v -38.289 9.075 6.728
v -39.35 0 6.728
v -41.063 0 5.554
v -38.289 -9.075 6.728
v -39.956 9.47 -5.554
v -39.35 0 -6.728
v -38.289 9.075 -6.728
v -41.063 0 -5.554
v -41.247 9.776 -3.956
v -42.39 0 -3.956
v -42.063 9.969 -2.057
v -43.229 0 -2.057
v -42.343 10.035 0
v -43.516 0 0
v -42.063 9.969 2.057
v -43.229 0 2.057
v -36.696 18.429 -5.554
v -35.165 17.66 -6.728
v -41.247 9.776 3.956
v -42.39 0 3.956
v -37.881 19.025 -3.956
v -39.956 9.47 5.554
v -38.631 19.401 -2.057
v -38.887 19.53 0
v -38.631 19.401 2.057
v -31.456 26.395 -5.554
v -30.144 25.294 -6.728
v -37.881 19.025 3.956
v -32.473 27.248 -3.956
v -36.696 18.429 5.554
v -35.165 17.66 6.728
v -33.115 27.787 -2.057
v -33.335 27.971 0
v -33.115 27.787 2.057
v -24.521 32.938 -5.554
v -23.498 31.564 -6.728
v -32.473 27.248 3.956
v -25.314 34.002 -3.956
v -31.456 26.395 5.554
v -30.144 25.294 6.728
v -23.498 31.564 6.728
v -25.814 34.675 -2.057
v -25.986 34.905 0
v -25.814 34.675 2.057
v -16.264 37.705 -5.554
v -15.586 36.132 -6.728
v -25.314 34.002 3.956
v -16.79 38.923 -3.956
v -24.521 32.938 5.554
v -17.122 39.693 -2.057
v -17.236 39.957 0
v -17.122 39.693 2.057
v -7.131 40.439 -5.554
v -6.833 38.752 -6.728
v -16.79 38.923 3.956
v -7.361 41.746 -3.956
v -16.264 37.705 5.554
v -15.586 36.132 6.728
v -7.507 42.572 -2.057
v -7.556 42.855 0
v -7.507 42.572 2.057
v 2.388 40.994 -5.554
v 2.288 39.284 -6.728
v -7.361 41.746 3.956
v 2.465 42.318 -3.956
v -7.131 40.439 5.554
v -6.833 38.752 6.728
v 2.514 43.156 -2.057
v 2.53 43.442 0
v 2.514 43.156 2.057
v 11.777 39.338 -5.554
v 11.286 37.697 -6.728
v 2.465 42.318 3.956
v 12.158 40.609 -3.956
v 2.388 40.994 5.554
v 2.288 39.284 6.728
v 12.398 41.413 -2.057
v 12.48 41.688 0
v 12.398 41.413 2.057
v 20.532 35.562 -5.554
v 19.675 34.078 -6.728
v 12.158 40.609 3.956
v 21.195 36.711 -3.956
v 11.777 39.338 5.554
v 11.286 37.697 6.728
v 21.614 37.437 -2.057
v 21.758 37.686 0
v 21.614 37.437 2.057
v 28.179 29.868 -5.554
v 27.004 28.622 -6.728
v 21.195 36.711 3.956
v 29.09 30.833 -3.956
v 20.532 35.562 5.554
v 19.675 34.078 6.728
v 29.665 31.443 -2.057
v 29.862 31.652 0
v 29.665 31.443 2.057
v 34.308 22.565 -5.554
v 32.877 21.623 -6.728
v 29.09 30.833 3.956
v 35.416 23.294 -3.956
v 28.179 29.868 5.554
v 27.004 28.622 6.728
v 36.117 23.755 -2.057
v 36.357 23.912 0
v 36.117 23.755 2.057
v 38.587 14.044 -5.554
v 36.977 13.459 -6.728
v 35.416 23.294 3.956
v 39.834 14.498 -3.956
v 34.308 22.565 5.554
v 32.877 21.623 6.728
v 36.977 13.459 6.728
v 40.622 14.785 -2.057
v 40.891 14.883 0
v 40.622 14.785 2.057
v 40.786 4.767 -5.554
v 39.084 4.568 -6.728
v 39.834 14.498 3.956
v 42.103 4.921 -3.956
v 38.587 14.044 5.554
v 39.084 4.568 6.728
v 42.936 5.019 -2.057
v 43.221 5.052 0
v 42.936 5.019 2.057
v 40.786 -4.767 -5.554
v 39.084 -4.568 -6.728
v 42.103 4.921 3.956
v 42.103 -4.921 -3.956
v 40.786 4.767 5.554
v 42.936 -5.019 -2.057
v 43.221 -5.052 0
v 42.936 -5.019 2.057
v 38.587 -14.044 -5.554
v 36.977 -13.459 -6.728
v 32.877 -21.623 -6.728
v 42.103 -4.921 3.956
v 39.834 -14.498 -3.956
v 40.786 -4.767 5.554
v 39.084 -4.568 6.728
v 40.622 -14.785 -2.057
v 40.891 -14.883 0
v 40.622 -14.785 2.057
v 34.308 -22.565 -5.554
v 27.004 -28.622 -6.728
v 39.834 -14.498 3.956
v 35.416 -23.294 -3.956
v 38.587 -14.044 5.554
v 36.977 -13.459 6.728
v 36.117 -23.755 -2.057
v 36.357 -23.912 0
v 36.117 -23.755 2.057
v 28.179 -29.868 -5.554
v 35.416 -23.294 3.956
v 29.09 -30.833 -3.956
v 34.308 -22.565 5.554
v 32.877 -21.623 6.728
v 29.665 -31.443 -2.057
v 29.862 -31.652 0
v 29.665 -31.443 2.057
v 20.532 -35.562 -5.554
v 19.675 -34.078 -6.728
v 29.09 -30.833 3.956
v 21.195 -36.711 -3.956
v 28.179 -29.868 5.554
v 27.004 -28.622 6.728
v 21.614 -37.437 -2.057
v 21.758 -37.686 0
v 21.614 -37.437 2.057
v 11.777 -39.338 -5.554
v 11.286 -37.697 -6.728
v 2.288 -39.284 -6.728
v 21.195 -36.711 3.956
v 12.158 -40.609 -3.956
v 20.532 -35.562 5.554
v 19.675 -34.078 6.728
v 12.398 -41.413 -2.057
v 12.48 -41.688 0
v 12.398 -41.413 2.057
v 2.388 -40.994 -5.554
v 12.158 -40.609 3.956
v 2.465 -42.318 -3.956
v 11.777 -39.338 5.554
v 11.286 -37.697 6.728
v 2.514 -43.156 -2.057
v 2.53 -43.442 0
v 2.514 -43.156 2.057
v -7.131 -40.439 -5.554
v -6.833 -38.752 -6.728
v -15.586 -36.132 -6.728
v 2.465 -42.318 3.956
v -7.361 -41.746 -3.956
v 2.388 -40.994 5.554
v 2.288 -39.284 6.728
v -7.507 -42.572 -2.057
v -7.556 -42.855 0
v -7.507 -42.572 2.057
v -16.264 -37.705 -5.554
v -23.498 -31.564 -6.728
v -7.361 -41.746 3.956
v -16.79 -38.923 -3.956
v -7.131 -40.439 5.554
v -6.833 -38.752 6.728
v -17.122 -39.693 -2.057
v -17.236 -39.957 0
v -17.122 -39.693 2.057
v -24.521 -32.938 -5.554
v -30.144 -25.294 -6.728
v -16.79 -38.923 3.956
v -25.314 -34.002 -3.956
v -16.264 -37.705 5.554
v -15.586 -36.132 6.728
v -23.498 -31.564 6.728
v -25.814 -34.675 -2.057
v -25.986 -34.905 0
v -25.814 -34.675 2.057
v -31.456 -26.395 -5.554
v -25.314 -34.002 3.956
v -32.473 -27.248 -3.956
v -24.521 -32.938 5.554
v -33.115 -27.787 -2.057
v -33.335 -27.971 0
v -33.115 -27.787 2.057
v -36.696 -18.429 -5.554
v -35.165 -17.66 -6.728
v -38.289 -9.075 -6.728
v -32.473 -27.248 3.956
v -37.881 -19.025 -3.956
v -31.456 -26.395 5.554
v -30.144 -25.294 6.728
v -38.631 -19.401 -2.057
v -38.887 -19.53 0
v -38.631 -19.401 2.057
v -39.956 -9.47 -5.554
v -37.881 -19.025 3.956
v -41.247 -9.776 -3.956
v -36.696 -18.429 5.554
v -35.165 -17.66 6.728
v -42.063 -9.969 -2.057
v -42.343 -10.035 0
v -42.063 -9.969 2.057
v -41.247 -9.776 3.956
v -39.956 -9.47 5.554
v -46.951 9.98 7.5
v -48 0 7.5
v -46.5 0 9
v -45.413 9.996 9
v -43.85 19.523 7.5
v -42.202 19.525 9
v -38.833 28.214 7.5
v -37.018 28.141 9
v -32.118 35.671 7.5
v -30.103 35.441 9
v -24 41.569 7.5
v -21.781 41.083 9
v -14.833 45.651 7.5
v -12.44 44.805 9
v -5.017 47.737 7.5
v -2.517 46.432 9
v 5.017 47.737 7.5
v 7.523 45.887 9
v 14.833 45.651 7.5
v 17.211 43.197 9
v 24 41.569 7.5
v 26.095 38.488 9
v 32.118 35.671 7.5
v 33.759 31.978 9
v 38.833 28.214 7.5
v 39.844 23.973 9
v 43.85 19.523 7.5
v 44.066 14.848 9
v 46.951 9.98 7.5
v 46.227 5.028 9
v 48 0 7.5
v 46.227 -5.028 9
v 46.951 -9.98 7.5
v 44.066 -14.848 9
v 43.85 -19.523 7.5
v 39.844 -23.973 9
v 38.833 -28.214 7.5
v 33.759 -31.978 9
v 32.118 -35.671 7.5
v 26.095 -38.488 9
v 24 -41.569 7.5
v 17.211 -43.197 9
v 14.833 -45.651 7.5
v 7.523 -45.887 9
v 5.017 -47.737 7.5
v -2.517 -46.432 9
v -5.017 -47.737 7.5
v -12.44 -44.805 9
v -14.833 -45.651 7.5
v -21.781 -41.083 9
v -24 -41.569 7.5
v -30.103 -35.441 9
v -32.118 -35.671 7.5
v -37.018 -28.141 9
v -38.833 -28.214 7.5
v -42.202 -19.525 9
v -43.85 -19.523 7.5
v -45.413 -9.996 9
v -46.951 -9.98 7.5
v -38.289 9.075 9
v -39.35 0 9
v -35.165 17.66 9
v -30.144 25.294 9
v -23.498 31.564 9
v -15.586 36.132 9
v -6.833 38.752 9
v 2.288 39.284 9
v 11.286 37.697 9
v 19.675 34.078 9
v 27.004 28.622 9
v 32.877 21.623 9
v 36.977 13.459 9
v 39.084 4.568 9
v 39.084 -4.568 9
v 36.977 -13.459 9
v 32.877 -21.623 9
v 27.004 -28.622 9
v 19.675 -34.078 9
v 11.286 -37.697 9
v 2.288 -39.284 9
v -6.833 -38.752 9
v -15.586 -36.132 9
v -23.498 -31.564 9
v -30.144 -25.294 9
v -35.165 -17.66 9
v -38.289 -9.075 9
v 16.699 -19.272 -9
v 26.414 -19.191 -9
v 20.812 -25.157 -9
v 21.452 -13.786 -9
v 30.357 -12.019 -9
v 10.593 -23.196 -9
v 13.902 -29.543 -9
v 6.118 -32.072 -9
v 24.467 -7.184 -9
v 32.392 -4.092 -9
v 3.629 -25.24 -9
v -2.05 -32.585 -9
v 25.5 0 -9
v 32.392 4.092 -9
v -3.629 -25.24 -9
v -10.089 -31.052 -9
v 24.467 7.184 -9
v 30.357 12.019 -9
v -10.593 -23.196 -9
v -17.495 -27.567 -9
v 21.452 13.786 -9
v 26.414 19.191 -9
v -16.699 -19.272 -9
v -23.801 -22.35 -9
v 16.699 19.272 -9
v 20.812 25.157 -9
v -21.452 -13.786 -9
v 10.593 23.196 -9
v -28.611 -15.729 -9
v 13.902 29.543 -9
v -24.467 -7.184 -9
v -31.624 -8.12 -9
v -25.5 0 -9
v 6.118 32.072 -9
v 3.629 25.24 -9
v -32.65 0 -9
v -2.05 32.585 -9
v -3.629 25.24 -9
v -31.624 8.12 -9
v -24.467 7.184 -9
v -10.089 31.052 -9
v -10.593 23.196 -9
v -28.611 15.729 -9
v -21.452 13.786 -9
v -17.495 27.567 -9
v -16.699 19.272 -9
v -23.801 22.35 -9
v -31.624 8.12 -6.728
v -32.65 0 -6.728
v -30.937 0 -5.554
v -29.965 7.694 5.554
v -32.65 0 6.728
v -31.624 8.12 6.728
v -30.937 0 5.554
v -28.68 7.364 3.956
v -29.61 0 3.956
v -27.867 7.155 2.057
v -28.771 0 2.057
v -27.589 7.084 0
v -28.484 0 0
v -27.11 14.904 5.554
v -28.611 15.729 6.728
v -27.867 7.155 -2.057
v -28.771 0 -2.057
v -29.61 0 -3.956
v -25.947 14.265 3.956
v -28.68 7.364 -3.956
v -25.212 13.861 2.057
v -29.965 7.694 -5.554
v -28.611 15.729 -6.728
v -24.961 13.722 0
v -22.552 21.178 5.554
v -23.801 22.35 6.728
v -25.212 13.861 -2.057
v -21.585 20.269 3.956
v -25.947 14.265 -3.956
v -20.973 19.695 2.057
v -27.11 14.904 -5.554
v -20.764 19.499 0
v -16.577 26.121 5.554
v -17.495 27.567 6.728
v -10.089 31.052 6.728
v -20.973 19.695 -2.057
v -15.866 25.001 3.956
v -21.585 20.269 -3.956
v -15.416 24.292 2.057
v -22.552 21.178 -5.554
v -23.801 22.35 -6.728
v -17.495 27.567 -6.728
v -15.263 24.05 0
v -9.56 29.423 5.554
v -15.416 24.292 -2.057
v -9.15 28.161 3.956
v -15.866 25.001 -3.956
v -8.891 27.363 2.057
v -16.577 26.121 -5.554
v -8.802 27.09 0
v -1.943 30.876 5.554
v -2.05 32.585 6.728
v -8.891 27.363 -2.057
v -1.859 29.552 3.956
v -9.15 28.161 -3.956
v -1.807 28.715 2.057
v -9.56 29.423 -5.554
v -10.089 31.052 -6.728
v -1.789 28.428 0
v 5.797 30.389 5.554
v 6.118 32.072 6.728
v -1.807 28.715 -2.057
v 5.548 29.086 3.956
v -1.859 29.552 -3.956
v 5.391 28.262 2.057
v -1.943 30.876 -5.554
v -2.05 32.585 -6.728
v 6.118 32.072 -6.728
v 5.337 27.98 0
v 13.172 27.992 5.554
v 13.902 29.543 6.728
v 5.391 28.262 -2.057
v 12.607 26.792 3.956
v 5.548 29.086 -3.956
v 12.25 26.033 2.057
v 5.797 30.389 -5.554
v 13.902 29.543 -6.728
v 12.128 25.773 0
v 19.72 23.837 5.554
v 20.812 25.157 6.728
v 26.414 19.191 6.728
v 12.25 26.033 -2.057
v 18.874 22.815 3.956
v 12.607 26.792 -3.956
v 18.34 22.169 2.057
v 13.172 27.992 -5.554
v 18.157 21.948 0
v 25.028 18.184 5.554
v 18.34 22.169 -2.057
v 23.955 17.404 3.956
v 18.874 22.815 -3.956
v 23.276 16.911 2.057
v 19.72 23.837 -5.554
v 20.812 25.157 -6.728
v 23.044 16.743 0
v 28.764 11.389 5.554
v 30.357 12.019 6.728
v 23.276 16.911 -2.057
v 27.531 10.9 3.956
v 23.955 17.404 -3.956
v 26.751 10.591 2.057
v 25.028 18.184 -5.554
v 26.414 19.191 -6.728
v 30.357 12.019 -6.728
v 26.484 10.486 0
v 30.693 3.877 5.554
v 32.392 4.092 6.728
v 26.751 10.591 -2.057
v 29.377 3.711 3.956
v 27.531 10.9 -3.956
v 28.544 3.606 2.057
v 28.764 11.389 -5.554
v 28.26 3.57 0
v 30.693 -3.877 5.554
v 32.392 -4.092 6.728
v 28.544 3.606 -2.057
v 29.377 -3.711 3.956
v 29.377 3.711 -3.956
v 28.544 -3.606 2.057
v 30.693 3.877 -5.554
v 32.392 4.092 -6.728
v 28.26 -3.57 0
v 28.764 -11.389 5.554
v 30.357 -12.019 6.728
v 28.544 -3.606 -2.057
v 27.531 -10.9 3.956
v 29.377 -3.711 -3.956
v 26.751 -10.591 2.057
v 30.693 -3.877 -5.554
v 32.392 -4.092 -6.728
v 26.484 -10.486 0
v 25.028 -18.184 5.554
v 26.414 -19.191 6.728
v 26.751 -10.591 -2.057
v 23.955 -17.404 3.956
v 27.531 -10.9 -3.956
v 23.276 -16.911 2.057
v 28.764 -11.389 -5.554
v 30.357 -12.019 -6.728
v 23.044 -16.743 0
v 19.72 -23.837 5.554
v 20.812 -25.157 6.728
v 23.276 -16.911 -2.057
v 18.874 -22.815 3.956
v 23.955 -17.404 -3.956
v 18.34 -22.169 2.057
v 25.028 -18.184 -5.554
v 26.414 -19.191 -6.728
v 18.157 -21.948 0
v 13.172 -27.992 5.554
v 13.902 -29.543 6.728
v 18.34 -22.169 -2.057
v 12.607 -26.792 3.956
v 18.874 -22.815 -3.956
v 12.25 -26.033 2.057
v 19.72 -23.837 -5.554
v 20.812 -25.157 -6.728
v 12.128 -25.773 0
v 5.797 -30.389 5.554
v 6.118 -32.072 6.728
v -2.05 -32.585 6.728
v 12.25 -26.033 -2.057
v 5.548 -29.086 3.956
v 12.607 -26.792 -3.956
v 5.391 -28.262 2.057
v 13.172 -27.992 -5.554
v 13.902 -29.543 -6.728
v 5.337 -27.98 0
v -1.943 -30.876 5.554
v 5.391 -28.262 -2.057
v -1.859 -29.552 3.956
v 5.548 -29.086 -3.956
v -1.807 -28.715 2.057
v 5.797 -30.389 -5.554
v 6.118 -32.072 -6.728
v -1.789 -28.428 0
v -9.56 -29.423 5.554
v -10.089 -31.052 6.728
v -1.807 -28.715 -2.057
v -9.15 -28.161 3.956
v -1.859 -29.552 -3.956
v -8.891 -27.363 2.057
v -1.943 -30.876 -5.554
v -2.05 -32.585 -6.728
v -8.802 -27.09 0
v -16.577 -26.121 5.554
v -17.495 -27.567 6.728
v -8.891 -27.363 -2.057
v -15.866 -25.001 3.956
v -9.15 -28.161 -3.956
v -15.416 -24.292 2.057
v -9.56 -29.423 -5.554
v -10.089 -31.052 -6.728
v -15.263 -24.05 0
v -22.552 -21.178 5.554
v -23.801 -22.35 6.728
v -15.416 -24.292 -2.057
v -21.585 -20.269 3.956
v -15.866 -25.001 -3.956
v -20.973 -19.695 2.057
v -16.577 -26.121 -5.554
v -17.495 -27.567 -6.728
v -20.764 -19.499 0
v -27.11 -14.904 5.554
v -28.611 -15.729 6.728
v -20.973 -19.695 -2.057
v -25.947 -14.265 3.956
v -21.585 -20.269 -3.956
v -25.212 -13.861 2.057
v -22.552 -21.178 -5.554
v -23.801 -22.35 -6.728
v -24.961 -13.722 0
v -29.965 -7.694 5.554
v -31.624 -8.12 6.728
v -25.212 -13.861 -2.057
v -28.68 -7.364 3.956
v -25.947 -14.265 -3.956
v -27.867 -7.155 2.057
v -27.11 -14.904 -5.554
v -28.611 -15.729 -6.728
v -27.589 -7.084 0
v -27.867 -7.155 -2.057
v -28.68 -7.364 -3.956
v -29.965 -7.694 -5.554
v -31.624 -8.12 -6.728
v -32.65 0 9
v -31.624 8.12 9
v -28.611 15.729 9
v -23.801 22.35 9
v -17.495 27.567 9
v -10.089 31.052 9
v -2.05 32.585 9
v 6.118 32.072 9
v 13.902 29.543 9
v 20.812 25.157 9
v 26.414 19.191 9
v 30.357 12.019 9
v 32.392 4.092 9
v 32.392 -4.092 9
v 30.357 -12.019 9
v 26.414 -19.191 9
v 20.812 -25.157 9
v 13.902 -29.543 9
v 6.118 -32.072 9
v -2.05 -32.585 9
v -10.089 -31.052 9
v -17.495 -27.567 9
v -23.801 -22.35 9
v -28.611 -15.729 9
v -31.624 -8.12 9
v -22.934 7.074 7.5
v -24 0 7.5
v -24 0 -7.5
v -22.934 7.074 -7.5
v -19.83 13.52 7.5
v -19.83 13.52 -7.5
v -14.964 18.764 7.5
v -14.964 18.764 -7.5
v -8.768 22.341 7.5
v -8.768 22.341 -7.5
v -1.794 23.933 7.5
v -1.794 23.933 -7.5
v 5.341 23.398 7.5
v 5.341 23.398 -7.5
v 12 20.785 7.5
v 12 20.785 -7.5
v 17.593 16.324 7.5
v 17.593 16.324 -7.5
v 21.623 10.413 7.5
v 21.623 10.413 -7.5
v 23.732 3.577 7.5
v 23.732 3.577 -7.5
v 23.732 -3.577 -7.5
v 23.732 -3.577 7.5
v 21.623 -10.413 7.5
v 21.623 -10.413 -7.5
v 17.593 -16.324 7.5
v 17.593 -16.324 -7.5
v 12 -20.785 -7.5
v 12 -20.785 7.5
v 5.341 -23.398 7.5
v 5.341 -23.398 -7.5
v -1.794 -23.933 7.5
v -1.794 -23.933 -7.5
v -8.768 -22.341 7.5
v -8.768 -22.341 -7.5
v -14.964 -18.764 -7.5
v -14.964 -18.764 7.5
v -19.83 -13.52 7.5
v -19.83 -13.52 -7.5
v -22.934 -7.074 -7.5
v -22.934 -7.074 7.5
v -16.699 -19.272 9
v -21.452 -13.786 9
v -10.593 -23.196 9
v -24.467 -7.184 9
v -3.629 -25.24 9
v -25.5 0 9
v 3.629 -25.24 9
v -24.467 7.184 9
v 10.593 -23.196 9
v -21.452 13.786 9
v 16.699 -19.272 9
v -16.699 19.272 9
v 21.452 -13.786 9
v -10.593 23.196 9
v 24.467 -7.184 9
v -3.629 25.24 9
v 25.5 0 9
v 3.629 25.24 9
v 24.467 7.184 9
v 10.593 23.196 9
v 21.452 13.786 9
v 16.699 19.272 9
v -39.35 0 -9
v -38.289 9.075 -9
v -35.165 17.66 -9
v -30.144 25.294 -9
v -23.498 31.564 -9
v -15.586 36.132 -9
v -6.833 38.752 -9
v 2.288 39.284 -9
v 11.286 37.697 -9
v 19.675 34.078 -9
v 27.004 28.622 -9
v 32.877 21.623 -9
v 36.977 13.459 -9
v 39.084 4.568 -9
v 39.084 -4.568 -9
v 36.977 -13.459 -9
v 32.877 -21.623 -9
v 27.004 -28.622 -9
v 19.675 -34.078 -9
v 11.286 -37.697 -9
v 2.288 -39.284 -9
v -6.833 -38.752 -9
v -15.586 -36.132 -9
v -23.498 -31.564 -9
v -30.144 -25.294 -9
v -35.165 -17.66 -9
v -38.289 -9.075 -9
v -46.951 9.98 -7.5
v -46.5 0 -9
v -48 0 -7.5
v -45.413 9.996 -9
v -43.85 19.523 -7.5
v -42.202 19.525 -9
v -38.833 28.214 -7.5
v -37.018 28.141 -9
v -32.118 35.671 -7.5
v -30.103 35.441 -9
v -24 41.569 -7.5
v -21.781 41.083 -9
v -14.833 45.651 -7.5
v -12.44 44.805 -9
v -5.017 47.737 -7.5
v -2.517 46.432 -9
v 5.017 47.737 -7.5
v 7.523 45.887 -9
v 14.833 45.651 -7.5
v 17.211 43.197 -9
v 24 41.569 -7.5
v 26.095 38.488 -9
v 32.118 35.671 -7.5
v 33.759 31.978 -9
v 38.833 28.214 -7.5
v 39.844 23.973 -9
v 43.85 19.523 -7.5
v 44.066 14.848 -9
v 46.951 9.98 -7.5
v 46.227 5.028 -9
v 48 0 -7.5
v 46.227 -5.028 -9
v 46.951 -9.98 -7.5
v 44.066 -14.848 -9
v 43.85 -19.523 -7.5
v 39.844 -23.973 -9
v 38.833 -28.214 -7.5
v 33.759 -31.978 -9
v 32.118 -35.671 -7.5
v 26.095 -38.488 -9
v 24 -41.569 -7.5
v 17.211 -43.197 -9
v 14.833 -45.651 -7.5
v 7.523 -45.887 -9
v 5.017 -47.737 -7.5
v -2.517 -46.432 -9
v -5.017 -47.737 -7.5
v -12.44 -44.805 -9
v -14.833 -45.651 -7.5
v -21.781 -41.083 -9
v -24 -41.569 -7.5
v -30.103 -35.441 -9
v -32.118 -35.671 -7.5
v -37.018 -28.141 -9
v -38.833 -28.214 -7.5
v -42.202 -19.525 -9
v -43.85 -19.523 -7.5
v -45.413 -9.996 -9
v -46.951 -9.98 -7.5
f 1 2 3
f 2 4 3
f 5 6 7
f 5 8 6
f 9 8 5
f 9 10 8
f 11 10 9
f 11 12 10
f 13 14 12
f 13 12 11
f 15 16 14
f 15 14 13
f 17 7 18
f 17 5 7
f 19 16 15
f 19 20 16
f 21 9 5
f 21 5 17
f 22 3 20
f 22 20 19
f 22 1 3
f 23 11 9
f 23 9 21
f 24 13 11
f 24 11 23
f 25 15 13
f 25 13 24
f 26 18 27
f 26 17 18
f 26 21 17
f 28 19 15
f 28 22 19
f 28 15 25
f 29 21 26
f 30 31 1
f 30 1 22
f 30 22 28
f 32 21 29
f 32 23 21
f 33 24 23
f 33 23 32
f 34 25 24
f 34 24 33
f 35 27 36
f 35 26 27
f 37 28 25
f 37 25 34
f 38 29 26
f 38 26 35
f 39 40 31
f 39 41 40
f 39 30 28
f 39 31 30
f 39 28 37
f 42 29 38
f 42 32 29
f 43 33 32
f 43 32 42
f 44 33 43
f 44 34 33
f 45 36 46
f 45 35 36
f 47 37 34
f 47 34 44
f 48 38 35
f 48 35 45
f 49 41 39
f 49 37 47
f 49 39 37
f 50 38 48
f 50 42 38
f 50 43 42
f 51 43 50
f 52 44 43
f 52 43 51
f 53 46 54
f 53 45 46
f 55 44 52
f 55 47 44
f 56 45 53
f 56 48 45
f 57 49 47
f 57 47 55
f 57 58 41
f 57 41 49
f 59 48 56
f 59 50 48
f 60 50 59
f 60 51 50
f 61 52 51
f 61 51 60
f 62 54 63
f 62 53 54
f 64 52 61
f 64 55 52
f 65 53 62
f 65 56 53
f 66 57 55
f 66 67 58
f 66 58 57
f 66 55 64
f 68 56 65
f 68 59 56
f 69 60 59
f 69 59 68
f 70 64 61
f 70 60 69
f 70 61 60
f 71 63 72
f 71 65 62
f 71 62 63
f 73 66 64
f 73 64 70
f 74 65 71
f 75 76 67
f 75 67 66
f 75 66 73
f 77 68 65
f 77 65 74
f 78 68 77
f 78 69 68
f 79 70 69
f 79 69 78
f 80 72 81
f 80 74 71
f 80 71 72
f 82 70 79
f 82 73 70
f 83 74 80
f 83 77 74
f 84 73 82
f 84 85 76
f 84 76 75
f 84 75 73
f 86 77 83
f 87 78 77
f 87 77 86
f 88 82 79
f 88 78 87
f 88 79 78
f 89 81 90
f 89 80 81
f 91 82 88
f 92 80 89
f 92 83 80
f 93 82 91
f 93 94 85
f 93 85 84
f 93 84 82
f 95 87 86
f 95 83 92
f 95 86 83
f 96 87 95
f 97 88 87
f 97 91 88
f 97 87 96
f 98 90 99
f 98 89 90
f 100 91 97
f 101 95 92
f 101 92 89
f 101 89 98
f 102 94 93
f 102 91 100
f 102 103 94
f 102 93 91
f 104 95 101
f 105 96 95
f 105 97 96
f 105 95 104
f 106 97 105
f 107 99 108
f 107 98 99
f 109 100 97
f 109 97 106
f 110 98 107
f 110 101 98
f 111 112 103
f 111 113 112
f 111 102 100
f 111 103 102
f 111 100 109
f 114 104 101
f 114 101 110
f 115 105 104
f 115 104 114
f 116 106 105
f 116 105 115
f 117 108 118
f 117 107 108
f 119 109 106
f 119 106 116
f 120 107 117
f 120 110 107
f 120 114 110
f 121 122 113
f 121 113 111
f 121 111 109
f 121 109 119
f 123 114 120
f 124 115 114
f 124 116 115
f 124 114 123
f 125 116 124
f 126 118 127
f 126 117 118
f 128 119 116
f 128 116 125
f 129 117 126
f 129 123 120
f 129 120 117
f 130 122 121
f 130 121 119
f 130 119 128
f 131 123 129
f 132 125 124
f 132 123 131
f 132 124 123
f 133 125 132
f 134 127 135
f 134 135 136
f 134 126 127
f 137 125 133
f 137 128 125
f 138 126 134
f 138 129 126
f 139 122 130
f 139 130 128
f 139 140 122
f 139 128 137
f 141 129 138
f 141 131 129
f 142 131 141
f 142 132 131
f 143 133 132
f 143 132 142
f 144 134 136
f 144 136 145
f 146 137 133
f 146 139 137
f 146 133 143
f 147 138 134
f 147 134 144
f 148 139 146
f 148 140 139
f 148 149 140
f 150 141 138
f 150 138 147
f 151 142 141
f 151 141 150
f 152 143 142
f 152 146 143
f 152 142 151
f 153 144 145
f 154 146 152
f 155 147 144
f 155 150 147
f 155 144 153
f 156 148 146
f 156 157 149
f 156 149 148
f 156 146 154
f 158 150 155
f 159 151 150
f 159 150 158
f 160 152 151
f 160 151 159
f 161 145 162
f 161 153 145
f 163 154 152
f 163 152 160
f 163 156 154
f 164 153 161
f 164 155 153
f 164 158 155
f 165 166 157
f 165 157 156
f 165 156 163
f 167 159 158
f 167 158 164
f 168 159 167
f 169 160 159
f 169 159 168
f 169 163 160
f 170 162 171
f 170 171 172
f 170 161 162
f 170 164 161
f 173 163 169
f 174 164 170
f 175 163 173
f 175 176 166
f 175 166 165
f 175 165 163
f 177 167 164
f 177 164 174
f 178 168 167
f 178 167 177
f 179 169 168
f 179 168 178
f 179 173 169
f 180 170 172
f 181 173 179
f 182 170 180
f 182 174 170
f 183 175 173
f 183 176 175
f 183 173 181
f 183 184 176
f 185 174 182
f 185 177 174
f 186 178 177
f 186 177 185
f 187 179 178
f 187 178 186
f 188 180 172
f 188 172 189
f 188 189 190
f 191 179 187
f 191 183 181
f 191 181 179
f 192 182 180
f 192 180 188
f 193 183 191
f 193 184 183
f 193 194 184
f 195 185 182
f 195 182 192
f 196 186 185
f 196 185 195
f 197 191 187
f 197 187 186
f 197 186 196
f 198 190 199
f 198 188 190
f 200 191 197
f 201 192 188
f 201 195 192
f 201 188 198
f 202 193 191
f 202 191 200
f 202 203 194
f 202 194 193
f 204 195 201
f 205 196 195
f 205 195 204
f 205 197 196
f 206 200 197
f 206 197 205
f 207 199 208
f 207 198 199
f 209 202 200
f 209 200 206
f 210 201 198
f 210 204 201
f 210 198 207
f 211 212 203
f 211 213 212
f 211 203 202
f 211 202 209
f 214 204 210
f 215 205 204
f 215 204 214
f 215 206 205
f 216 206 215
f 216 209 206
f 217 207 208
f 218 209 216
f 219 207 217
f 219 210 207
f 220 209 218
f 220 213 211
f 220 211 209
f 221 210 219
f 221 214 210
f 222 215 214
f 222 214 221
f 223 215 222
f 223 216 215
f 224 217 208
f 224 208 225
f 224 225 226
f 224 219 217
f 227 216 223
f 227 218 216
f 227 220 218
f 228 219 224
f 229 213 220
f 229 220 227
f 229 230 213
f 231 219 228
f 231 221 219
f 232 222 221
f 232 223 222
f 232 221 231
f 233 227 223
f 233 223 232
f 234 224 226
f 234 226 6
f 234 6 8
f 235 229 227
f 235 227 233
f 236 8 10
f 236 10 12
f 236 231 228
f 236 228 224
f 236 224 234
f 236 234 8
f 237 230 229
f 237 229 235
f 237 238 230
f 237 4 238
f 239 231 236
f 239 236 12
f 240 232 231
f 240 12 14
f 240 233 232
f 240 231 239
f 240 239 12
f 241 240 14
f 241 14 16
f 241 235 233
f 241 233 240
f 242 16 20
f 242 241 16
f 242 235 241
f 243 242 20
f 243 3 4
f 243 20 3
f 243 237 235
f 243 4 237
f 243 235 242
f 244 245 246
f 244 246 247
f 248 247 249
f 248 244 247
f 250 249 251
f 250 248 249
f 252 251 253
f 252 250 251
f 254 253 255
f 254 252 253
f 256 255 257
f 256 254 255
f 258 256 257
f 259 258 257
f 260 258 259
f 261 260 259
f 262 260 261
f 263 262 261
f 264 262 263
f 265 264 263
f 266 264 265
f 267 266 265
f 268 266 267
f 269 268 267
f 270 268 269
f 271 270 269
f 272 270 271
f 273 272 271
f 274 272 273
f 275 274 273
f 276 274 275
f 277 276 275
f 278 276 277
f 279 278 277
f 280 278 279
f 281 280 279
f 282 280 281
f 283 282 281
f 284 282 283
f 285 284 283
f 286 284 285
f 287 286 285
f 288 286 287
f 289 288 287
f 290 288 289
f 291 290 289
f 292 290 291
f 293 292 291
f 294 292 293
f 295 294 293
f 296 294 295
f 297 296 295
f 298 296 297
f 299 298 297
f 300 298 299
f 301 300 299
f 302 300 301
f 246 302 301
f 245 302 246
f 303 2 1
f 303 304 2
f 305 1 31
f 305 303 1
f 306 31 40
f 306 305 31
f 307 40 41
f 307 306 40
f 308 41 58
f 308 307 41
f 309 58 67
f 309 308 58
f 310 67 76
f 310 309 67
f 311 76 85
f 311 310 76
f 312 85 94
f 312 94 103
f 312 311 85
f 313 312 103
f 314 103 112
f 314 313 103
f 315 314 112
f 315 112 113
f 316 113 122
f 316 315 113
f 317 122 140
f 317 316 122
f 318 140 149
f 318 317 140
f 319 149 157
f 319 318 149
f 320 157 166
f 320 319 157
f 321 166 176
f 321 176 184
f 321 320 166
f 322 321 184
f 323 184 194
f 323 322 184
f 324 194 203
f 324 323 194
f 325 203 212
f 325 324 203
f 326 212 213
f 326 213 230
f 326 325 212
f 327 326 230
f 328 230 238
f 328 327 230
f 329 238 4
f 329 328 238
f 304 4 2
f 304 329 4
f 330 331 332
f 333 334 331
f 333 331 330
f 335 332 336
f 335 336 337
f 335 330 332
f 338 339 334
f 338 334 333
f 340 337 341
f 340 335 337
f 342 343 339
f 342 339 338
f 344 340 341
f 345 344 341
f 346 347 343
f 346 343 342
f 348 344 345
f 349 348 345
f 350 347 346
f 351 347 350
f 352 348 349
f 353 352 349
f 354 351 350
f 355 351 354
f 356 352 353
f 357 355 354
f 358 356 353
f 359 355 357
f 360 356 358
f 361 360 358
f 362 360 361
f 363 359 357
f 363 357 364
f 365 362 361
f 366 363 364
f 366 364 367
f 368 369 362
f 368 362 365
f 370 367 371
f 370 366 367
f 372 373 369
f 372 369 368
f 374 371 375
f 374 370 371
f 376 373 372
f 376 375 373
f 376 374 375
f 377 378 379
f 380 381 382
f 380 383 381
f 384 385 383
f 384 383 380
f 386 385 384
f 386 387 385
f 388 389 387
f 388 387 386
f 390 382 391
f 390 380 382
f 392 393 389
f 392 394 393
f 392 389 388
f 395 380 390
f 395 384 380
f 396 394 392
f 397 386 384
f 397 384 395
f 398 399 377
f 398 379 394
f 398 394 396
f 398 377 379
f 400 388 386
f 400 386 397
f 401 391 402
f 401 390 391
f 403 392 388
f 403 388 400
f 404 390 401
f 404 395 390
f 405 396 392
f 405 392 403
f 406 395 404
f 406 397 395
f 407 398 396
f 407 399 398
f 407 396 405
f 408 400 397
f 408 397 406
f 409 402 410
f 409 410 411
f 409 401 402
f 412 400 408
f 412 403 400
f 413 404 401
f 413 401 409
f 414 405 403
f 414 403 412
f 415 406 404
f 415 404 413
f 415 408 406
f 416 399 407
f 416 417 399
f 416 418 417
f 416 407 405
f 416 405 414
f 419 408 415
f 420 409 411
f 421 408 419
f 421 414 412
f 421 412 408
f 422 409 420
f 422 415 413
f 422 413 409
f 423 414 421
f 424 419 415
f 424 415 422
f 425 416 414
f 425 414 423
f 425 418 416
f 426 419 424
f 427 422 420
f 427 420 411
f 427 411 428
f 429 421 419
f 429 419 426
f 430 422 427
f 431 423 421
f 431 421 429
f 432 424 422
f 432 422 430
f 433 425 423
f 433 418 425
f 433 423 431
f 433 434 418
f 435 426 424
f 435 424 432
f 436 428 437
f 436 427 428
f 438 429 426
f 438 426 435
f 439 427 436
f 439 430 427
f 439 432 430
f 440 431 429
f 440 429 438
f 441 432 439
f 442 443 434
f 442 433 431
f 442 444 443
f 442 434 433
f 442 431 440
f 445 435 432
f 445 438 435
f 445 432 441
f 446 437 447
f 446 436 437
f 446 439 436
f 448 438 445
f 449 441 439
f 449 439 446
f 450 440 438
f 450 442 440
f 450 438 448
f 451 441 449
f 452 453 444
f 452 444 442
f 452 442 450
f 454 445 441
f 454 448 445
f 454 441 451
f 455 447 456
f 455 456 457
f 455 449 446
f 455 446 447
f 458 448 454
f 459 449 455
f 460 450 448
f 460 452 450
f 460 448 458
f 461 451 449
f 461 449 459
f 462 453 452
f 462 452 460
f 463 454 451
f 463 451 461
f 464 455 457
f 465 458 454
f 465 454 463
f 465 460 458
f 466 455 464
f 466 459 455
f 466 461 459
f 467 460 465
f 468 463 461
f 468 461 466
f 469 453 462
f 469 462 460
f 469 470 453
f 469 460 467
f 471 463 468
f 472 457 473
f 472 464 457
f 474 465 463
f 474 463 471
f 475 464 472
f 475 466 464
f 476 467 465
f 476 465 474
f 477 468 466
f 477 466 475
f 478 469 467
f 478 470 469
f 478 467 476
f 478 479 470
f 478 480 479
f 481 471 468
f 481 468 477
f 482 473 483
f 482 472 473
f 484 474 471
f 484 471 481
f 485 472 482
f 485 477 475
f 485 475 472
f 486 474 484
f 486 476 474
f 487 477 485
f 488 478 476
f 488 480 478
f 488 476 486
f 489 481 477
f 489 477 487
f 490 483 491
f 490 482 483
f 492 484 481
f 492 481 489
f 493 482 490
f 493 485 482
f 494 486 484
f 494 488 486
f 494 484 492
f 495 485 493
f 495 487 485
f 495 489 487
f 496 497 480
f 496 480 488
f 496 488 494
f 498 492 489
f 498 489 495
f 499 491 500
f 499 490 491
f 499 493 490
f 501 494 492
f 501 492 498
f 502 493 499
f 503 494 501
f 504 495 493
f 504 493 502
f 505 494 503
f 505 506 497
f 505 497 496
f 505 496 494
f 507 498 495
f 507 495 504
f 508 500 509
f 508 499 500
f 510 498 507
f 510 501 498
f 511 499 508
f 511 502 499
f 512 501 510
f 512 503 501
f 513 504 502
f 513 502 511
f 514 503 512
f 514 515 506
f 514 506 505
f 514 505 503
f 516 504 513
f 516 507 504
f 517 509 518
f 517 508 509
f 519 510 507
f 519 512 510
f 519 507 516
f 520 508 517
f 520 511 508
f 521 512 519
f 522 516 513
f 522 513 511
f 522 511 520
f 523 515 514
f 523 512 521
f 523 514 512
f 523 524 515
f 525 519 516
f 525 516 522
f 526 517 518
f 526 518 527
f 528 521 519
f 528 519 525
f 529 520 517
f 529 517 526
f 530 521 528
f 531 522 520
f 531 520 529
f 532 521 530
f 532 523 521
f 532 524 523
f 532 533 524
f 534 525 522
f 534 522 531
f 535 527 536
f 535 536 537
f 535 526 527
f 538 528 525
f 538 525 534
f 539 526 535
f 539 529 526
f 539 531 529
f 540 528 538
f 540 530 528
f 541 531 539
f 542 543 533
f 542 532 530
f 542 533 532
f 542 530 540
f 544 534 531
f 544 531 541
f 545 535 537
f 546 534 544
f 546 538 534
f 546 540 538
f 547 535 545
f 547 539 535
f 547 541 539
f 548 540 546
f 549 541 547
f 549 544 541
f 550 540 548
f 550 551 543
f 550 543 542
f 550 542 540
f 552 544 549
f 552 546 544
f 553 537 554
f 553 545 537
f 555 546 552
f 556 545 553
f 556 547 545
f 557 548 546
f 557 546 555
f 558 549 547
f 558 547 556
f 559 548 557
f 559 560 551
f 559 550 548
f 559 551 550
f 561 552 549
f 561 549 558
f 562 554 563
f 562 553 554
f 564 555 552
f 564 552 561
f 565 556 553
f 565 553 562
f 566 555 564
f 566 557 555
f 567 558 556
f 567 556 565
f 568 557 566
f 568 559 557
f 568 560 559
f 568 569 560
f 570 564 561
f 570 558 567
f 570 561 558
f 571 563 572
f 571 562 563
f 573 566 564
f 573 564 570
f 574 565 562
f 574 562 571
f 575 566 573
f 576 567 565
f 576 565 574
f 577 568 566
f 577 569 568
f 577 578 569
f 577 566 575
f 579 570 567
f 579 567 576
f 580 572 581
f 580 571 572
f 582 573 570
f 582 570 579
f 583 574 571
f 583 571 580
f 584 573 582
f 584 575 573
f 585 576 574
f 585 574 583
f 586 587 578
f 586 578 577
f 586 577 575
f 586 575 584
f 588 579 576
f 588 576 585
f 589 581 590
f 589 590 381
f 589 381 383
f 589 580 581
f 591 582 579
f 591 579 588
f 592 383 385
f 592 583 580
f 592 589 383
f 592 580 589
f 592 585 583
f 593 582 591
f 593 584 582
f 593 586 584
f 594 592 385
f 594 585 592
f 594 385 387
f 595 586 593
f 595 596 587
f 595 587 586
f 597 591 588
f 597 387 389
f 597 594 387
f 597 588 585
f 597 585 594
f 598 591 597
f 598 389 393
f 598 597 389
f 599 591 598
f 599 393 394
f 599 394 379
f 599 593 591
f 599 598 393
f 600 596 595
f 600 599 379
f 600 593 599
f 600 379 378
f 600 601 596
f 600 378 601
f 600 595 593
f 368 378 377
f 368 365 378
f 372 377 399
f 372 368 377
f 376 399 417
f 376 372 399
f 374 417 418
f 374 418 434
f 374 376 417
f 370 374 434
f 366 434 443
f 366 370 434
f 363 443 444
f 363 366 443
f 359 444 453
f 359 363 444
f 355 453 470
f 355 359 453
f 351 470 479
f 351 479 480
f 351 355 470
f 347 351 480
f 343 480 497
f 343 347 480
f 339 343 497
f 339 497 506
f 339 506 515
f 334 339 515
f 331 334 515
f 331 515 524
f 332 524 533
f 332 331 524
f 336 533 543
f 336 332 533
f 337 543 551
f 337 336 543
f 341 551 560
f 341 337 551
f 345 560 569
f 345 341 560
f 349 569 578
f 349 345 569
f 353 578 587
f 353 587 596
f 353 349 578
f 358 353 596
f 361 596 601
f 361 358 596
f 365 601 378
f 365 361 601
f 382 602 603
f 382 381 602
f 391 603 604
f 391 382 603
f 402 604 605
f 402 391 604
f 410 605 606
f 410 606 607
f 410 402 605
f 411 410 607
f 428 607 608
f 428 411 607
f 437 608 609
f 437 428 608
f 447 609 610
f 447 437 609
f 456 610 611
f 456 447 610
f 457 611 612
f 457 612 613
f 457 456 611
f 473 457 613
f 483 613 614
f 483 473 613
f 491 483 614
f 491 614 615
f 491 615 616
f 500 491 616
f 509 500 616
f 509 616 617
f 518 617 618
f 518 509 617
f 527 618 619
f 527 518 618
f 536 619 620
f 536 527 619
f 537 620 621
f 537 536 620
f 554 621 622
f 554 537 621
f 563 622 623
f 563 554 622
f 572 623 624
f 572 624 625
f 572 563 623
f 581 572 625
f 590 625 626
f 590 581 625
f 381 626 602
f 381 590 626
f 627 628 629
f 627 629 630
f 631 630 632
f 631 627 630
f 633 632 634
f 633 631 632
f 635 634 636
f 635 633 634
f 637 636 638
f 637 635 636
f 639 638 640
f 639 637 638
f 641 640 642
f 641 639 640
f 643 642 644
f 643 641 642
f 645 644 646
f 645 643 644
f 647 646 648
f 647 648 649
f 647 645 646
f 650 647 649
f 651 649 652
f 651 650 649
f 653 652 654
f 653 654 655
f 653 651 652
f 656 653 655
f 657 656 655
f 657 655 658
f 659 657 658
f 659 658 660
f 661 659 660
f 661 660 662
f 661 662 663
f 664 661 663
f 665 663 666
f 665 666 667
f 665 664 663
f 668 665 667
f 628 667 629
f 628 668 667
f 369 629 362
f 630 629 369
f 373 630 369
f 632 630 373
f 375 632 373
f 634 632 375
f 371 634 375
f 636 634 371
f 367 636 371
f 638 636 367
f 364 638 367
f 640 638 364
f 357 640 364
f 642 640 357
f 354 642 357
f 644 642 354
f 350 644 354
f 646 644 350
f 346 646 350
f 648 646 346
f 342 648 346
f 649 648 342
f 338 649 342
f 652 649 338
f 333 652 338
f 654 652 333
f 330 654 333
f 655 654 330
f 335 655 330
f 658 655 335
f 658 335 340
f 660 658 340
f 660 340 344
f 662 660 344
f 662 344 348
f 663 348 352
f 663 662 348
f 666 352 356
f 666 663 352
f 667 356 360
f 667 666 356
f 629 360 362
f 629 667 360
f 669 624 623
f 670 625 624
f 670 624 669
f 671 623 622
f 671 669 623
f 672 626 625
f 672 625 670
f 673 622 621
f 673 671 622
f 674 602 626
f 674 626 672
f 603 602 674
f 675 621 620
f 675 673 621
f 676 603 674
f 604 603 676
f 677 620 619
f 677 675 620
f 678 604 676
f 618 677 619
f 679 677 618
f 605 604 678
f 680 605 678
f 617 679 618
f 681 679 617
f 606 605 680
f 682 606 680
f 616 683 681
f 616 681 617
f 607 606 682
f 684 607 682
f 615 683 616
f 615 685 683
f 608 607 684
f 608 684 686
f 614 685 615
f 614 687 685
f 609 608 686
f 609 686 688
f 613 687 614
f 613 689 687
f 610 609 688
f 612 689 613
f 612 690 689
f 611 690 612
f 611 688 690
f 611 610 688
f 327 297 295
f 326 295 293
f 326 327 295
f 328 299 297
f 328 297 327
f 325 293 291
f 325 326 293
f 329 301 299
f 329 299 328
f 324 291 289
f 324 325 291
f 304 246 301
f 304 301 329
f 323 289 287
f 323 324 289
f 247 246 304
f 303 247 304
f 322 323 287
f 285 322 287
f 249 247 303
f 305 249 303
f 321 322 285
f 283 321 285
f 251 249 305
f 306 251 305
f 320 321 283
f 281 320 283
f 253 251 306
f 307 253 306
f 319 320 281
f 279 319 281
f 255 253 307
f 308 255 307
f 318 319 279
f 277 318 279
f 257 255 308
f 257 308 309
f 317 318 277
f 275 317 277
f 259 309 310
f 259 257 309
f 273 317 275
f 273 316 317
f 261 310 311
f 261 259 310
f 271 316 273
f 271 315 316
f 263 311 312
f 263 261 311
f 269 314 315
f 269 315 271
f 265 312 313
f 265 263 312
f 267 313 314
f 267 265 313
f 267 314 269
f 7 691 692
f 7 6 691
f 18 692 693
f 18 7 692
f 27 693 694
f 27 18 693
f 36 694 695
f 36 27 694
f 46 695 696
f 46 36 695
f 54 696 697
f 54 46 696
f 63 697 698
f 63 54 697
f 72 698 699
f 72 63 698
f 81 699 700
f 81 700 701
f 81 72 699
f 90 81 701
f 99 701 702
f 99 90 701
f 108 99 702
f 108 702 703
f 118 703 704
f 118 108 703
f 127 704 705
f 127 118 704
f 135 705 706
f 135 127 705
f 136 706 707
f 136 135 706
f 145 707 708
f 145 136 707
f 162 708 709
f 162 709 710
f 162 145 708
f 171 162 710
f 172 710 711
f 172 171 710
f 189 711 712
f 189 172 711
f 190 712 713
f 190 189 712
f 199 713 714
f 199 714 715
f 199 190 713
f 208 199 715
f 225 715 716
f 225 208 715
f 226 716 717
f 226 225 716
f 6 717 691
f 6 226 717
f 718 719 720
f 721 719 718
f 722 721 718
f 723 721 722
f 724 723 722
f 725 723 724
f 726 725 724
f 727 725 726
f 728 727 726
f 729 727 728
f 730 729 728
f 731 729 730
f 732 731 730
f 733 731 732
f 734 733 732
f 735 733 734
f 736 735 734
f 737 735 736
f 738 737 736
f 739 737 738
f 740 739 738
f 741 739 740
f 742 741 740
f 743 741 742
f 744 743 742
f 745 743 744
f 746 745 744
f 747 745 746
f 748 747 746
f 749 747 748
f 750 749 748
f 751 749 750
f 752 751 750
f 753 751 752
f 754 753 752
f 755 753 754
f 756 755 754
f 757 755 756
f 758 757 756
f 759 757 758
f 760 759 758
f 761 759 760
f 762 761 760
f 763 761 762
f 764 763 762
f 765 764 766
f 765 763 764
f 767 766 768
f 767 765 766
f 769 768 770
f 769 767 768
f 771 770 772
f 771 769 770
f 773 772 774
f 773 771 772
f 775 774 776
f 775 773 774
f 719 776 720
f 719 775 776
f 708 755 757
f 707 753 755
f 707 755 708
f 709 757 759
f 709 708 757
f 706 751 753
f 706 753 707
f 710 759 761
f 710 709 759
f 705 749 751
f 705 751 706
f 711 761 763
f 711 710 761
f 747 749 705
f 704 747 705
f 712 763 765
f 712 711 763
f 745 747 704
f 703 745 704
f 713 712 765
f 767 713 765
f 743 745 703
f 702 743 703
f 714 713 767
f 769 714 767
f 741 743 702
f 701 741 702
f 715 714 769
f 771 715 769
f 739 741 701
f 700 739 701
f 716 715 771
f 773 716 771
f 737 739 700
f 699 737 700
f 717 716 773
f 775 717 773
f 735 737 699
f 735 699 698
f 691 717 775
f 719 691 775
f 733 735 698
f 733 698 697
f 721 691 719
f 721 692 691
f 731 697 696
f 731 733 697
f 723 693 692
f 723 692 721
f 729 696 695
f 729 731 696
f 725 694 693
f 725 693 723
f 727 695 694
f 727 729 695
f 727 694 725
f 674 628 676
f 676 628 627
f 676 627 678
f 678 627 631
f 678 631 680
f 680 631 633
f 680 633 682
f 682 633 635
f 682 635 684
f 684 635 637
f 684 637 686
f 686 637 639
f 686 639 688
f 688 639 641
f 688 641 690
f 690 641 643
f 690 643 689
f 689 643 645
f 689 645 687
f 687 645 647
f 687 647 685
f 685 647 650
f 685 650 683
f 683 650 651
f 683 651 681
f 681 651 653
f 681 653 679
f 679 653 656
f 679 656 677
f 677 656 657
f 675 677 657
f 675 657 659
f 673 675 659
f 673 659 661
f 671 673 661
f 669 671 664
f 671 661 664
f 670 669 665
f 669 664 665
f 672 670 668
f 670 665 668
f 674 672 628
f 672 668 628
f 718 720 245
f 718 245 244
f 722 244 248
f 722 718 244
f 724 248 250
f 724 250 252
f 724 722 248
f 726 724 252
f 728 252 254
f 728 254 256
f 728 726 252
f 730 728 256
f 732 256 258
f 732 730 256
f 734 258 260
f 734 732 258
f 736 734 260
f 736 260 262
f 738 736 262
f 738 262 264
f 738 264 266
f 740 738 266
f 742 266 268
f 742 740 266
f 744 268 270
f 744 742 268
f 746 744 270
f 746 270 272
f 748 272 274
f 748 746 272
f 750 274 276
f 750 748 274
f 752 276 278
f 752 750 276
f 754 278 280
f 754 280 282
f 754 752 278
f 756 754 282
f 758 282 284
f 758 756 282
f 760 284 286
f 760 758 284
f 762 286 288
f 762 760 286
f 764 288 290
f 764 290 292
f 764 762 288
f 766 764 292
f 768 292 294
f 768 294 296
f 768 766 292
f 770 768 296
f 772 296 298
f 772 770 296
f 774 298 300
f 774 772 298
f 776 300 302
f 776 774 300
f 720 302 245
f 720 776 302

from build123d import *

# Parameters (mm, degrees)
F2_SIZE   = 1.5
F2_2_SIZE = 1.5


# Not quite as in the source:
# - a feature of the source that left no trace in its solid (it failed there, or was rolled back) is left out
# - the program builds the solid bodies; features that only make, move or delete a surface that nothing else refers to are left out


with BuildPart() as f1:
    # F0 (on Front) → F1 (revolve)
    with BuildSketch(Plane.XZ):
        with BuildLine():
            ThreePointArc((-39.3501091827, -6.7276512101), (-43.5156185601, 0), (-39.3501091827, 6.7276512101))
            Line((-39.3501091827, 6.7276512101), (-39.3501091827, 9))
            Line((-39.3501091827, 9), (-48, 9))
            Line((-48, 9), (-48, -9))
            Line((-48, -9), (-39.3501091827, -9))
            Line((-39.3501091827, -9), (-39.3501091827, -6.7276512101))
        make_face()
    revolve(axis=Axis((0, 0, -2.1557251625), (0, 0, -1)))

    # F2
    f2_edges = [f1.edges().sort_by_distance(p)[0] for p in [
        (48, 0, 9),
        (48, 0, -9),
    ]]
    chamfer(f2_edges, length=F2_SIZE)


with BuildPart() as f1b:
    # F0 (on Front) → F1, piece 2 (revolve)
    with BuildSketch(Plane.XZ):
        with BuildLine():
            Line((-24, 9), (-32.6498908173, 9))
            Line((-32.6498908173, 9), (-32.6498908173, 6.7276512101))
            ThreePointArc((-32.6498908173, 6.7276512101), (-28.4843814399, 0), (-32.6498908173, -6.7276512101))
            Line((-32.6498908173, -6.7276512101), (-32.6498908173, -9))
            Line((-32.6498908173, -9), (-24, -9))
            Line((-24, -9), (-24, 9))
        make_face()
    revolve(axis=Axis((0, 0, -2.1557251625), (0, 0, -1)))

    # F2#2
    f2_2_edges = [f1b.edges().sort_by_distance(p)[0] for p in [
        (24, 0, 9),
        (24, 0, -9),
    ]]
    chamfer(f2_2_edges, length=F2_2_SIZE)


solid = Compound([f1.part, f1b.part])
